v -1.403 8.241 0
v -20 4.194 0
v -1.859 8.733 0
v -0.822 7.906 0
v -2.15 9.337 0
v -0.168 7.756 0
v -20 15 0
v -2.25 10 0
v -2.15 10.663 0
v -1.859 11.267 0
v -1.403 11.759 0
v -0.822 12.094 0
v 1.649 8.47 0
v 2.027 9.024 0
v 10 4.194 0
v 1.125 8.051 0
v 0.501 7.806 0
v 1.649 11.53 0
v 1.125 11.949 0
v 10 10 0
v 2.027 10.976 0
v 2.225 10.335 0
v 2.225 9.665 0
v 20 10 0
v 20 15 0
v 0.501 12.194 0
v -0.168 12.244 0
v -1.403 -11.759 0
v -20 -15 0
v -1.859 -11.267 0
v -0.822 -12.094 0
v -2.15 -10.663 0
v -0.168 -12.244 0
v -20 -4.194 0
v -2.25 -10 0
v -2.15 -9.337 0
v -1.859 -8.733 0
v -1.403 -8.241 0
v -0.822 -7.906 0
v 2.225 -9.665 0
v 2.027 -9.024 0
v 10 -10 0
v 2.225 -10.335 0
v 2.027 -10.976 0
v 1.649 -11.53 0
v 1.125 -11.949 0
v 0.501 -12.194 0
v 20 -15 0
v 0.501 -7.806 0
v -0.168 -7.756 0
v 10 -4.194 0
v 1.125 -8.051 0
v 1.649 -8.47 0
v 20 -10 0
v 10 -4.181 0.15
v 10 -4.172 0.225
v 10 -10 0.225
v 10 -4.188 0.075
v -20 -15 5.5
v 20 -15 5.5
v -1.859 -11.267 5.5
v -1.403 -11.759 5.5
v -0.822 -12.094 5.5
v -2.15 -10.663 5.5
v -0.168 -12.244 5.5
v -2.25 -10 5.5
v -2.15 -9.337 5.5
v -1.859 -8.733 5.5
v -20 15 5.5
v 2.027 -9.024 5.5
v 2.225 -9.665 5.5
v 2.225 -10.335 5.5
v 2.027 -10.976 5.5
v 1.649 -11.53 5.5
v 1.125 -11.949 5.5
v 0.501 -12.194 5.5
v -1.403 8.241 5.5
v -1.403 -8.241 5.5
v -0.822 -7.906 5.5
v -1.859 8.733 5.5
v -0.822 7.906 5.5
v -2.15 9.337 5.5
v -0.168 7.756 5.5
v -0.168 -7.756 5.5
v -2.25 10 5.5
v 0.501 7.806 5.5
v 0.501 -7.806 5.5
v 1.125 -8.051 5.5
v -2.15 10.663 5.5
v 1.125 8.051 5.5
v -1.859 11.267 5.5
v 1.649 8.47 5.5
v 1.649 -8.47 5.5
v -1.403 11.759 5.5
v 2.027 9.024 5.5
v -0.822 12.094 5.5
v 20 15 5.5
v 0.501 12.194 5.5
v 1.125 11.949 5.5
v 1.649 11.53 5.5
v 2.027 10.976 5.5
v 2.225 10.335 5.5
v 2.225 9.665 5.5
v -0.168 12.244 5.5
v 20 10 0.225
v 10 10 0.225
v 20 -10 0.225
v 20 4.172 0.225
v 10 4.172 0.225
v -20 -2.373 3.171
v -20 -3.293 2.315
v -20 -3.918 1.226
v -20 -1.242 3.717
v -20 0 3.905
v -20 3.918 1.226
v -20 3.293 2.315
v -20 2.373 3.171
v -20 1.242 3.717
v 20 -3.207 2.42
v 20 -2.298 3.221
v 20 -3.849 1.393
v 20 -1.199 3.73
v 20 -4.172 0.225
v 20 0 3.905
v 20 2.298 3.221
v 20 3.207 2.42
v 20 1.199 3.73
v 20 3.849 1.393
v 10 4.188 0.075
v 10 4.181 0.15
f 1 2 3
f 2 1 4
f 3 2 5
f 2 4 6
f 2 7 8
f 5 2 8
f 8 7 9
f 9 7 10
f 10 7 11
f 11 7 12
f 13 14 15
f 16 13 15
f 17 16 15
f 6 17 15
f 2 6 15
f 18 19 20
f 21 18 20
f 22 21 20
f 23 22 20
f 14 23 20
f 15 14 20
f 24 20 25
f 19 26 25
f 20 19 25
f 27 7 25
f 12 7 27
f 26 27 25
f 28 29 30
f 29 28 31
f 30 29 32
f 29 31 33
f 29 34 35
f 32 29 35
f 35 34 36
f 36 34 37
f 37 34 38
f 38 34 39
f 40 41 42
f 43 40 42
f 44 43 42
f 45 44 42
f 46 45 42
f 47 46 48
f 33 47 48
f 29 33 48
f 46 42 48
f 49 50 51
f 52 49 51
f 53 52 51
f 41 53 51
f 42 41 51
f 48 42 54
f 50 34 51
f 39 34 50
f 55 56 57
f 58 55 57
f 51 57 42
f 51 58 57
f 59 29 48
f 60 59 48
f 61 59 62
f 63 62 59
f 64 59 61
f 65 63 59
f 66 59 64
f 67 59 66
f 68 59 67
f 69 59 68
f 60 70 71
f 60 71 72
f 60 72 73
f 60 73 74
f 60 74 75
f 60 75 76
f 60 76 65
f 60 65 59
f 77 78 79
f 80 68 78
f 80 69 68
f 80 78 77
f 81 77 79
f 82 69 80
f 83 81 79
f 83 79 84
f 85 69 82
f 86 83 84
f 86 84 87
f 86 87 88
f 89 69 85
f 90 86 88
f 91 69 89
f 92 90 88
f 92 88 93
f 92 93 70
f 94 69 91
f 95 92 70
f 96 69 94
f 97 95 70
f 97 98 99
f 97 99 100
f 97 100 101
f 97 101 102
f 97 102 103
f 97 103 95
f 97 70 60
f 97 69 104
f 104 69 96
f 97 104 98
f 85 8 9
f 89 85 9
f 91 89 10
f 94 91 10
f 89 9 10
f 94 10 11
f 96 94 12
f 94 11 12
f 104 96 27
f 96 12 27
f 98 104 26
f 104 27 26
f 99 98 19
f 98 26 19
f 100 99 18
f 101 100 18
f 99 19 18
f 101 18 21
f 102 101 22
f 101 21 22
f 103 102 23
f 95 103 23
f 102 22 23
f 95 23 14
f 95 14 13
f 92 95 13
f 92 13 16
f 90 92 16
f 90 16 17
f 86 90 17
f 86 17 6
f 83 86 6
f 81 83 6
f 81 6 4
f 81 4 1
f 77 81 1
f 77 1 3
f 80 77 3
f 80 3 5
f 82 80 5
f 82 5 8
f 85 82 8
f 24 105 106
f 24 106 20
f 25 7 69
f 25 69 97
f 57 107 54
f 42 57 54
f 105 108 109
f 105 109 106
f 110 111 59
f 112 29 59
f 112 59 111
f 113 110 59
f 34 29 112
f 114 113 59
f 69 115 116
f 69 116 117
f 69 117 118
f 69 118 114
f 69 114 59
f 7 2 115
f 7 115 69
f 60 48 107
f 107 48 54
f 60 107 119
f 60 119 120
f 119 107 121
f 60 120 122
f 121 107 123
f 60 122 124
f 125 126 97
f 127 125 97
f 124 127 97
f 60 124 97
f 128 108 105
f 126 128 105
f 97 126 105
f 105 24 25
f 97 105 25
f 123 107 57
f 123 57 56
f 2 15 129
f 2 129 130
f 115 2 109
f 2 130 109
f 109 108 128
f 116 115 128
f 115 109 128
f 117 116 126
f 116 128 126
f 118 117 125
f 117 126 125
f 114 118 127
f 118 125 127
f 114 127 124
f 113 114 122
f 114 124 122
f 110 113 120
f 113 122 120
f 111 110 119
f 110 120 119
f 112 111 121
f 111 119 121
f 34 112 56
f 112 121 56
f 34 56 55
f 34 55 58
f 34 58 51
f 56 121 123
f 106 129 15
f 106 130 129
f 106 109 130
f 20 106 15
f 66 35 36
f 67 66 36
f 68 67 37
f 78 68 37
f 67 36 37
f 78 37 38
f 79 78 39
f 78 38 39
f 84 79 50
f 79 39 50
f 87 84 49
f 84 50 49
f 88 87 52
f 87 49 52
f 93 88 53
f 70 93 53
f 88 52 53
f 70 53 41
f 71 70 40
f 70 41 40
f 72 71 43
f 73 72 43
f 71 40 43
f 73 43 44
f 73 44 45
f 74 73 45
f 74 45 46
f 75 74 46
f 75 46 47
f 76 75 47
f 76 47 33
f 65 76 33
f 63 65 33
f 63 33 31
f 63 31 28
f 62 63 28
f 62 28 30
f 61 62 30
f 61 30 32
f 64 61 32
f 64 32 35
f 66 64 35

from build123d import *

# Parameters (mm, degrees)
SKETCH1_W            = 40
SKETCH1_H            = 30
BOSS_EXTRUDE1_DEPTH  = 5.5
SKETCH2_R            = 4.205
CUT_EXTRUDE1_DEPTH   = 44.072613109
M4_CLEARANCE_HOLE1_D = 4.5
SKETCH7_W            = 1.05
SKETCH7_H            = 20
CUT_EXTRUDE2_DEPTH   = 10


with BuildPart() as part:
    # Sketch1 → Boss-Extrude1 (new body)
    with BuildSketch(Plane.XY):
        Rectangle(SKETCH1_W, SKETCH1_H)
    extrude(amount=BOSS_EXTRUDE1_DEPTH)

    # Sketch2 → Cut-Extrude1 (cut, through all)
    with BuildSketch(Plane(origin=(20, 0, 0), x_dir=(0, 0, -1), z_dir=(1, 0, 0))):
        with Locations((0.3, 0)):
            Circle(SKETCH2_R)
    extrude(amount=-CUT_EXTRUDE1_DEPTH, mode=Mode.SUBTRACT)

    # M4 Clearance Hole1 (through all)
    with Locations(Plane.XY.offset(5.5)):
        with Locations((0, 10), (0, -10)):
            Hole(M4_CLEARANCE_HOLE1_D / 2)

    # Sketch7 → Cut-Extrude2 (cut)
    with BuildSketch(Plane(origin=(20, 0, 0), x_dir=(0, 0, -1), z_dir=(1, 0, 0))):
        with Locations((0.3, 0)):
            Rectangle(SKETCH7_W, SKETCH7_H)
    extrude(amount=-CUT_EXTRUDE2_DEPTH, mode=Mode.SUBTRACT)


solid = part.part
